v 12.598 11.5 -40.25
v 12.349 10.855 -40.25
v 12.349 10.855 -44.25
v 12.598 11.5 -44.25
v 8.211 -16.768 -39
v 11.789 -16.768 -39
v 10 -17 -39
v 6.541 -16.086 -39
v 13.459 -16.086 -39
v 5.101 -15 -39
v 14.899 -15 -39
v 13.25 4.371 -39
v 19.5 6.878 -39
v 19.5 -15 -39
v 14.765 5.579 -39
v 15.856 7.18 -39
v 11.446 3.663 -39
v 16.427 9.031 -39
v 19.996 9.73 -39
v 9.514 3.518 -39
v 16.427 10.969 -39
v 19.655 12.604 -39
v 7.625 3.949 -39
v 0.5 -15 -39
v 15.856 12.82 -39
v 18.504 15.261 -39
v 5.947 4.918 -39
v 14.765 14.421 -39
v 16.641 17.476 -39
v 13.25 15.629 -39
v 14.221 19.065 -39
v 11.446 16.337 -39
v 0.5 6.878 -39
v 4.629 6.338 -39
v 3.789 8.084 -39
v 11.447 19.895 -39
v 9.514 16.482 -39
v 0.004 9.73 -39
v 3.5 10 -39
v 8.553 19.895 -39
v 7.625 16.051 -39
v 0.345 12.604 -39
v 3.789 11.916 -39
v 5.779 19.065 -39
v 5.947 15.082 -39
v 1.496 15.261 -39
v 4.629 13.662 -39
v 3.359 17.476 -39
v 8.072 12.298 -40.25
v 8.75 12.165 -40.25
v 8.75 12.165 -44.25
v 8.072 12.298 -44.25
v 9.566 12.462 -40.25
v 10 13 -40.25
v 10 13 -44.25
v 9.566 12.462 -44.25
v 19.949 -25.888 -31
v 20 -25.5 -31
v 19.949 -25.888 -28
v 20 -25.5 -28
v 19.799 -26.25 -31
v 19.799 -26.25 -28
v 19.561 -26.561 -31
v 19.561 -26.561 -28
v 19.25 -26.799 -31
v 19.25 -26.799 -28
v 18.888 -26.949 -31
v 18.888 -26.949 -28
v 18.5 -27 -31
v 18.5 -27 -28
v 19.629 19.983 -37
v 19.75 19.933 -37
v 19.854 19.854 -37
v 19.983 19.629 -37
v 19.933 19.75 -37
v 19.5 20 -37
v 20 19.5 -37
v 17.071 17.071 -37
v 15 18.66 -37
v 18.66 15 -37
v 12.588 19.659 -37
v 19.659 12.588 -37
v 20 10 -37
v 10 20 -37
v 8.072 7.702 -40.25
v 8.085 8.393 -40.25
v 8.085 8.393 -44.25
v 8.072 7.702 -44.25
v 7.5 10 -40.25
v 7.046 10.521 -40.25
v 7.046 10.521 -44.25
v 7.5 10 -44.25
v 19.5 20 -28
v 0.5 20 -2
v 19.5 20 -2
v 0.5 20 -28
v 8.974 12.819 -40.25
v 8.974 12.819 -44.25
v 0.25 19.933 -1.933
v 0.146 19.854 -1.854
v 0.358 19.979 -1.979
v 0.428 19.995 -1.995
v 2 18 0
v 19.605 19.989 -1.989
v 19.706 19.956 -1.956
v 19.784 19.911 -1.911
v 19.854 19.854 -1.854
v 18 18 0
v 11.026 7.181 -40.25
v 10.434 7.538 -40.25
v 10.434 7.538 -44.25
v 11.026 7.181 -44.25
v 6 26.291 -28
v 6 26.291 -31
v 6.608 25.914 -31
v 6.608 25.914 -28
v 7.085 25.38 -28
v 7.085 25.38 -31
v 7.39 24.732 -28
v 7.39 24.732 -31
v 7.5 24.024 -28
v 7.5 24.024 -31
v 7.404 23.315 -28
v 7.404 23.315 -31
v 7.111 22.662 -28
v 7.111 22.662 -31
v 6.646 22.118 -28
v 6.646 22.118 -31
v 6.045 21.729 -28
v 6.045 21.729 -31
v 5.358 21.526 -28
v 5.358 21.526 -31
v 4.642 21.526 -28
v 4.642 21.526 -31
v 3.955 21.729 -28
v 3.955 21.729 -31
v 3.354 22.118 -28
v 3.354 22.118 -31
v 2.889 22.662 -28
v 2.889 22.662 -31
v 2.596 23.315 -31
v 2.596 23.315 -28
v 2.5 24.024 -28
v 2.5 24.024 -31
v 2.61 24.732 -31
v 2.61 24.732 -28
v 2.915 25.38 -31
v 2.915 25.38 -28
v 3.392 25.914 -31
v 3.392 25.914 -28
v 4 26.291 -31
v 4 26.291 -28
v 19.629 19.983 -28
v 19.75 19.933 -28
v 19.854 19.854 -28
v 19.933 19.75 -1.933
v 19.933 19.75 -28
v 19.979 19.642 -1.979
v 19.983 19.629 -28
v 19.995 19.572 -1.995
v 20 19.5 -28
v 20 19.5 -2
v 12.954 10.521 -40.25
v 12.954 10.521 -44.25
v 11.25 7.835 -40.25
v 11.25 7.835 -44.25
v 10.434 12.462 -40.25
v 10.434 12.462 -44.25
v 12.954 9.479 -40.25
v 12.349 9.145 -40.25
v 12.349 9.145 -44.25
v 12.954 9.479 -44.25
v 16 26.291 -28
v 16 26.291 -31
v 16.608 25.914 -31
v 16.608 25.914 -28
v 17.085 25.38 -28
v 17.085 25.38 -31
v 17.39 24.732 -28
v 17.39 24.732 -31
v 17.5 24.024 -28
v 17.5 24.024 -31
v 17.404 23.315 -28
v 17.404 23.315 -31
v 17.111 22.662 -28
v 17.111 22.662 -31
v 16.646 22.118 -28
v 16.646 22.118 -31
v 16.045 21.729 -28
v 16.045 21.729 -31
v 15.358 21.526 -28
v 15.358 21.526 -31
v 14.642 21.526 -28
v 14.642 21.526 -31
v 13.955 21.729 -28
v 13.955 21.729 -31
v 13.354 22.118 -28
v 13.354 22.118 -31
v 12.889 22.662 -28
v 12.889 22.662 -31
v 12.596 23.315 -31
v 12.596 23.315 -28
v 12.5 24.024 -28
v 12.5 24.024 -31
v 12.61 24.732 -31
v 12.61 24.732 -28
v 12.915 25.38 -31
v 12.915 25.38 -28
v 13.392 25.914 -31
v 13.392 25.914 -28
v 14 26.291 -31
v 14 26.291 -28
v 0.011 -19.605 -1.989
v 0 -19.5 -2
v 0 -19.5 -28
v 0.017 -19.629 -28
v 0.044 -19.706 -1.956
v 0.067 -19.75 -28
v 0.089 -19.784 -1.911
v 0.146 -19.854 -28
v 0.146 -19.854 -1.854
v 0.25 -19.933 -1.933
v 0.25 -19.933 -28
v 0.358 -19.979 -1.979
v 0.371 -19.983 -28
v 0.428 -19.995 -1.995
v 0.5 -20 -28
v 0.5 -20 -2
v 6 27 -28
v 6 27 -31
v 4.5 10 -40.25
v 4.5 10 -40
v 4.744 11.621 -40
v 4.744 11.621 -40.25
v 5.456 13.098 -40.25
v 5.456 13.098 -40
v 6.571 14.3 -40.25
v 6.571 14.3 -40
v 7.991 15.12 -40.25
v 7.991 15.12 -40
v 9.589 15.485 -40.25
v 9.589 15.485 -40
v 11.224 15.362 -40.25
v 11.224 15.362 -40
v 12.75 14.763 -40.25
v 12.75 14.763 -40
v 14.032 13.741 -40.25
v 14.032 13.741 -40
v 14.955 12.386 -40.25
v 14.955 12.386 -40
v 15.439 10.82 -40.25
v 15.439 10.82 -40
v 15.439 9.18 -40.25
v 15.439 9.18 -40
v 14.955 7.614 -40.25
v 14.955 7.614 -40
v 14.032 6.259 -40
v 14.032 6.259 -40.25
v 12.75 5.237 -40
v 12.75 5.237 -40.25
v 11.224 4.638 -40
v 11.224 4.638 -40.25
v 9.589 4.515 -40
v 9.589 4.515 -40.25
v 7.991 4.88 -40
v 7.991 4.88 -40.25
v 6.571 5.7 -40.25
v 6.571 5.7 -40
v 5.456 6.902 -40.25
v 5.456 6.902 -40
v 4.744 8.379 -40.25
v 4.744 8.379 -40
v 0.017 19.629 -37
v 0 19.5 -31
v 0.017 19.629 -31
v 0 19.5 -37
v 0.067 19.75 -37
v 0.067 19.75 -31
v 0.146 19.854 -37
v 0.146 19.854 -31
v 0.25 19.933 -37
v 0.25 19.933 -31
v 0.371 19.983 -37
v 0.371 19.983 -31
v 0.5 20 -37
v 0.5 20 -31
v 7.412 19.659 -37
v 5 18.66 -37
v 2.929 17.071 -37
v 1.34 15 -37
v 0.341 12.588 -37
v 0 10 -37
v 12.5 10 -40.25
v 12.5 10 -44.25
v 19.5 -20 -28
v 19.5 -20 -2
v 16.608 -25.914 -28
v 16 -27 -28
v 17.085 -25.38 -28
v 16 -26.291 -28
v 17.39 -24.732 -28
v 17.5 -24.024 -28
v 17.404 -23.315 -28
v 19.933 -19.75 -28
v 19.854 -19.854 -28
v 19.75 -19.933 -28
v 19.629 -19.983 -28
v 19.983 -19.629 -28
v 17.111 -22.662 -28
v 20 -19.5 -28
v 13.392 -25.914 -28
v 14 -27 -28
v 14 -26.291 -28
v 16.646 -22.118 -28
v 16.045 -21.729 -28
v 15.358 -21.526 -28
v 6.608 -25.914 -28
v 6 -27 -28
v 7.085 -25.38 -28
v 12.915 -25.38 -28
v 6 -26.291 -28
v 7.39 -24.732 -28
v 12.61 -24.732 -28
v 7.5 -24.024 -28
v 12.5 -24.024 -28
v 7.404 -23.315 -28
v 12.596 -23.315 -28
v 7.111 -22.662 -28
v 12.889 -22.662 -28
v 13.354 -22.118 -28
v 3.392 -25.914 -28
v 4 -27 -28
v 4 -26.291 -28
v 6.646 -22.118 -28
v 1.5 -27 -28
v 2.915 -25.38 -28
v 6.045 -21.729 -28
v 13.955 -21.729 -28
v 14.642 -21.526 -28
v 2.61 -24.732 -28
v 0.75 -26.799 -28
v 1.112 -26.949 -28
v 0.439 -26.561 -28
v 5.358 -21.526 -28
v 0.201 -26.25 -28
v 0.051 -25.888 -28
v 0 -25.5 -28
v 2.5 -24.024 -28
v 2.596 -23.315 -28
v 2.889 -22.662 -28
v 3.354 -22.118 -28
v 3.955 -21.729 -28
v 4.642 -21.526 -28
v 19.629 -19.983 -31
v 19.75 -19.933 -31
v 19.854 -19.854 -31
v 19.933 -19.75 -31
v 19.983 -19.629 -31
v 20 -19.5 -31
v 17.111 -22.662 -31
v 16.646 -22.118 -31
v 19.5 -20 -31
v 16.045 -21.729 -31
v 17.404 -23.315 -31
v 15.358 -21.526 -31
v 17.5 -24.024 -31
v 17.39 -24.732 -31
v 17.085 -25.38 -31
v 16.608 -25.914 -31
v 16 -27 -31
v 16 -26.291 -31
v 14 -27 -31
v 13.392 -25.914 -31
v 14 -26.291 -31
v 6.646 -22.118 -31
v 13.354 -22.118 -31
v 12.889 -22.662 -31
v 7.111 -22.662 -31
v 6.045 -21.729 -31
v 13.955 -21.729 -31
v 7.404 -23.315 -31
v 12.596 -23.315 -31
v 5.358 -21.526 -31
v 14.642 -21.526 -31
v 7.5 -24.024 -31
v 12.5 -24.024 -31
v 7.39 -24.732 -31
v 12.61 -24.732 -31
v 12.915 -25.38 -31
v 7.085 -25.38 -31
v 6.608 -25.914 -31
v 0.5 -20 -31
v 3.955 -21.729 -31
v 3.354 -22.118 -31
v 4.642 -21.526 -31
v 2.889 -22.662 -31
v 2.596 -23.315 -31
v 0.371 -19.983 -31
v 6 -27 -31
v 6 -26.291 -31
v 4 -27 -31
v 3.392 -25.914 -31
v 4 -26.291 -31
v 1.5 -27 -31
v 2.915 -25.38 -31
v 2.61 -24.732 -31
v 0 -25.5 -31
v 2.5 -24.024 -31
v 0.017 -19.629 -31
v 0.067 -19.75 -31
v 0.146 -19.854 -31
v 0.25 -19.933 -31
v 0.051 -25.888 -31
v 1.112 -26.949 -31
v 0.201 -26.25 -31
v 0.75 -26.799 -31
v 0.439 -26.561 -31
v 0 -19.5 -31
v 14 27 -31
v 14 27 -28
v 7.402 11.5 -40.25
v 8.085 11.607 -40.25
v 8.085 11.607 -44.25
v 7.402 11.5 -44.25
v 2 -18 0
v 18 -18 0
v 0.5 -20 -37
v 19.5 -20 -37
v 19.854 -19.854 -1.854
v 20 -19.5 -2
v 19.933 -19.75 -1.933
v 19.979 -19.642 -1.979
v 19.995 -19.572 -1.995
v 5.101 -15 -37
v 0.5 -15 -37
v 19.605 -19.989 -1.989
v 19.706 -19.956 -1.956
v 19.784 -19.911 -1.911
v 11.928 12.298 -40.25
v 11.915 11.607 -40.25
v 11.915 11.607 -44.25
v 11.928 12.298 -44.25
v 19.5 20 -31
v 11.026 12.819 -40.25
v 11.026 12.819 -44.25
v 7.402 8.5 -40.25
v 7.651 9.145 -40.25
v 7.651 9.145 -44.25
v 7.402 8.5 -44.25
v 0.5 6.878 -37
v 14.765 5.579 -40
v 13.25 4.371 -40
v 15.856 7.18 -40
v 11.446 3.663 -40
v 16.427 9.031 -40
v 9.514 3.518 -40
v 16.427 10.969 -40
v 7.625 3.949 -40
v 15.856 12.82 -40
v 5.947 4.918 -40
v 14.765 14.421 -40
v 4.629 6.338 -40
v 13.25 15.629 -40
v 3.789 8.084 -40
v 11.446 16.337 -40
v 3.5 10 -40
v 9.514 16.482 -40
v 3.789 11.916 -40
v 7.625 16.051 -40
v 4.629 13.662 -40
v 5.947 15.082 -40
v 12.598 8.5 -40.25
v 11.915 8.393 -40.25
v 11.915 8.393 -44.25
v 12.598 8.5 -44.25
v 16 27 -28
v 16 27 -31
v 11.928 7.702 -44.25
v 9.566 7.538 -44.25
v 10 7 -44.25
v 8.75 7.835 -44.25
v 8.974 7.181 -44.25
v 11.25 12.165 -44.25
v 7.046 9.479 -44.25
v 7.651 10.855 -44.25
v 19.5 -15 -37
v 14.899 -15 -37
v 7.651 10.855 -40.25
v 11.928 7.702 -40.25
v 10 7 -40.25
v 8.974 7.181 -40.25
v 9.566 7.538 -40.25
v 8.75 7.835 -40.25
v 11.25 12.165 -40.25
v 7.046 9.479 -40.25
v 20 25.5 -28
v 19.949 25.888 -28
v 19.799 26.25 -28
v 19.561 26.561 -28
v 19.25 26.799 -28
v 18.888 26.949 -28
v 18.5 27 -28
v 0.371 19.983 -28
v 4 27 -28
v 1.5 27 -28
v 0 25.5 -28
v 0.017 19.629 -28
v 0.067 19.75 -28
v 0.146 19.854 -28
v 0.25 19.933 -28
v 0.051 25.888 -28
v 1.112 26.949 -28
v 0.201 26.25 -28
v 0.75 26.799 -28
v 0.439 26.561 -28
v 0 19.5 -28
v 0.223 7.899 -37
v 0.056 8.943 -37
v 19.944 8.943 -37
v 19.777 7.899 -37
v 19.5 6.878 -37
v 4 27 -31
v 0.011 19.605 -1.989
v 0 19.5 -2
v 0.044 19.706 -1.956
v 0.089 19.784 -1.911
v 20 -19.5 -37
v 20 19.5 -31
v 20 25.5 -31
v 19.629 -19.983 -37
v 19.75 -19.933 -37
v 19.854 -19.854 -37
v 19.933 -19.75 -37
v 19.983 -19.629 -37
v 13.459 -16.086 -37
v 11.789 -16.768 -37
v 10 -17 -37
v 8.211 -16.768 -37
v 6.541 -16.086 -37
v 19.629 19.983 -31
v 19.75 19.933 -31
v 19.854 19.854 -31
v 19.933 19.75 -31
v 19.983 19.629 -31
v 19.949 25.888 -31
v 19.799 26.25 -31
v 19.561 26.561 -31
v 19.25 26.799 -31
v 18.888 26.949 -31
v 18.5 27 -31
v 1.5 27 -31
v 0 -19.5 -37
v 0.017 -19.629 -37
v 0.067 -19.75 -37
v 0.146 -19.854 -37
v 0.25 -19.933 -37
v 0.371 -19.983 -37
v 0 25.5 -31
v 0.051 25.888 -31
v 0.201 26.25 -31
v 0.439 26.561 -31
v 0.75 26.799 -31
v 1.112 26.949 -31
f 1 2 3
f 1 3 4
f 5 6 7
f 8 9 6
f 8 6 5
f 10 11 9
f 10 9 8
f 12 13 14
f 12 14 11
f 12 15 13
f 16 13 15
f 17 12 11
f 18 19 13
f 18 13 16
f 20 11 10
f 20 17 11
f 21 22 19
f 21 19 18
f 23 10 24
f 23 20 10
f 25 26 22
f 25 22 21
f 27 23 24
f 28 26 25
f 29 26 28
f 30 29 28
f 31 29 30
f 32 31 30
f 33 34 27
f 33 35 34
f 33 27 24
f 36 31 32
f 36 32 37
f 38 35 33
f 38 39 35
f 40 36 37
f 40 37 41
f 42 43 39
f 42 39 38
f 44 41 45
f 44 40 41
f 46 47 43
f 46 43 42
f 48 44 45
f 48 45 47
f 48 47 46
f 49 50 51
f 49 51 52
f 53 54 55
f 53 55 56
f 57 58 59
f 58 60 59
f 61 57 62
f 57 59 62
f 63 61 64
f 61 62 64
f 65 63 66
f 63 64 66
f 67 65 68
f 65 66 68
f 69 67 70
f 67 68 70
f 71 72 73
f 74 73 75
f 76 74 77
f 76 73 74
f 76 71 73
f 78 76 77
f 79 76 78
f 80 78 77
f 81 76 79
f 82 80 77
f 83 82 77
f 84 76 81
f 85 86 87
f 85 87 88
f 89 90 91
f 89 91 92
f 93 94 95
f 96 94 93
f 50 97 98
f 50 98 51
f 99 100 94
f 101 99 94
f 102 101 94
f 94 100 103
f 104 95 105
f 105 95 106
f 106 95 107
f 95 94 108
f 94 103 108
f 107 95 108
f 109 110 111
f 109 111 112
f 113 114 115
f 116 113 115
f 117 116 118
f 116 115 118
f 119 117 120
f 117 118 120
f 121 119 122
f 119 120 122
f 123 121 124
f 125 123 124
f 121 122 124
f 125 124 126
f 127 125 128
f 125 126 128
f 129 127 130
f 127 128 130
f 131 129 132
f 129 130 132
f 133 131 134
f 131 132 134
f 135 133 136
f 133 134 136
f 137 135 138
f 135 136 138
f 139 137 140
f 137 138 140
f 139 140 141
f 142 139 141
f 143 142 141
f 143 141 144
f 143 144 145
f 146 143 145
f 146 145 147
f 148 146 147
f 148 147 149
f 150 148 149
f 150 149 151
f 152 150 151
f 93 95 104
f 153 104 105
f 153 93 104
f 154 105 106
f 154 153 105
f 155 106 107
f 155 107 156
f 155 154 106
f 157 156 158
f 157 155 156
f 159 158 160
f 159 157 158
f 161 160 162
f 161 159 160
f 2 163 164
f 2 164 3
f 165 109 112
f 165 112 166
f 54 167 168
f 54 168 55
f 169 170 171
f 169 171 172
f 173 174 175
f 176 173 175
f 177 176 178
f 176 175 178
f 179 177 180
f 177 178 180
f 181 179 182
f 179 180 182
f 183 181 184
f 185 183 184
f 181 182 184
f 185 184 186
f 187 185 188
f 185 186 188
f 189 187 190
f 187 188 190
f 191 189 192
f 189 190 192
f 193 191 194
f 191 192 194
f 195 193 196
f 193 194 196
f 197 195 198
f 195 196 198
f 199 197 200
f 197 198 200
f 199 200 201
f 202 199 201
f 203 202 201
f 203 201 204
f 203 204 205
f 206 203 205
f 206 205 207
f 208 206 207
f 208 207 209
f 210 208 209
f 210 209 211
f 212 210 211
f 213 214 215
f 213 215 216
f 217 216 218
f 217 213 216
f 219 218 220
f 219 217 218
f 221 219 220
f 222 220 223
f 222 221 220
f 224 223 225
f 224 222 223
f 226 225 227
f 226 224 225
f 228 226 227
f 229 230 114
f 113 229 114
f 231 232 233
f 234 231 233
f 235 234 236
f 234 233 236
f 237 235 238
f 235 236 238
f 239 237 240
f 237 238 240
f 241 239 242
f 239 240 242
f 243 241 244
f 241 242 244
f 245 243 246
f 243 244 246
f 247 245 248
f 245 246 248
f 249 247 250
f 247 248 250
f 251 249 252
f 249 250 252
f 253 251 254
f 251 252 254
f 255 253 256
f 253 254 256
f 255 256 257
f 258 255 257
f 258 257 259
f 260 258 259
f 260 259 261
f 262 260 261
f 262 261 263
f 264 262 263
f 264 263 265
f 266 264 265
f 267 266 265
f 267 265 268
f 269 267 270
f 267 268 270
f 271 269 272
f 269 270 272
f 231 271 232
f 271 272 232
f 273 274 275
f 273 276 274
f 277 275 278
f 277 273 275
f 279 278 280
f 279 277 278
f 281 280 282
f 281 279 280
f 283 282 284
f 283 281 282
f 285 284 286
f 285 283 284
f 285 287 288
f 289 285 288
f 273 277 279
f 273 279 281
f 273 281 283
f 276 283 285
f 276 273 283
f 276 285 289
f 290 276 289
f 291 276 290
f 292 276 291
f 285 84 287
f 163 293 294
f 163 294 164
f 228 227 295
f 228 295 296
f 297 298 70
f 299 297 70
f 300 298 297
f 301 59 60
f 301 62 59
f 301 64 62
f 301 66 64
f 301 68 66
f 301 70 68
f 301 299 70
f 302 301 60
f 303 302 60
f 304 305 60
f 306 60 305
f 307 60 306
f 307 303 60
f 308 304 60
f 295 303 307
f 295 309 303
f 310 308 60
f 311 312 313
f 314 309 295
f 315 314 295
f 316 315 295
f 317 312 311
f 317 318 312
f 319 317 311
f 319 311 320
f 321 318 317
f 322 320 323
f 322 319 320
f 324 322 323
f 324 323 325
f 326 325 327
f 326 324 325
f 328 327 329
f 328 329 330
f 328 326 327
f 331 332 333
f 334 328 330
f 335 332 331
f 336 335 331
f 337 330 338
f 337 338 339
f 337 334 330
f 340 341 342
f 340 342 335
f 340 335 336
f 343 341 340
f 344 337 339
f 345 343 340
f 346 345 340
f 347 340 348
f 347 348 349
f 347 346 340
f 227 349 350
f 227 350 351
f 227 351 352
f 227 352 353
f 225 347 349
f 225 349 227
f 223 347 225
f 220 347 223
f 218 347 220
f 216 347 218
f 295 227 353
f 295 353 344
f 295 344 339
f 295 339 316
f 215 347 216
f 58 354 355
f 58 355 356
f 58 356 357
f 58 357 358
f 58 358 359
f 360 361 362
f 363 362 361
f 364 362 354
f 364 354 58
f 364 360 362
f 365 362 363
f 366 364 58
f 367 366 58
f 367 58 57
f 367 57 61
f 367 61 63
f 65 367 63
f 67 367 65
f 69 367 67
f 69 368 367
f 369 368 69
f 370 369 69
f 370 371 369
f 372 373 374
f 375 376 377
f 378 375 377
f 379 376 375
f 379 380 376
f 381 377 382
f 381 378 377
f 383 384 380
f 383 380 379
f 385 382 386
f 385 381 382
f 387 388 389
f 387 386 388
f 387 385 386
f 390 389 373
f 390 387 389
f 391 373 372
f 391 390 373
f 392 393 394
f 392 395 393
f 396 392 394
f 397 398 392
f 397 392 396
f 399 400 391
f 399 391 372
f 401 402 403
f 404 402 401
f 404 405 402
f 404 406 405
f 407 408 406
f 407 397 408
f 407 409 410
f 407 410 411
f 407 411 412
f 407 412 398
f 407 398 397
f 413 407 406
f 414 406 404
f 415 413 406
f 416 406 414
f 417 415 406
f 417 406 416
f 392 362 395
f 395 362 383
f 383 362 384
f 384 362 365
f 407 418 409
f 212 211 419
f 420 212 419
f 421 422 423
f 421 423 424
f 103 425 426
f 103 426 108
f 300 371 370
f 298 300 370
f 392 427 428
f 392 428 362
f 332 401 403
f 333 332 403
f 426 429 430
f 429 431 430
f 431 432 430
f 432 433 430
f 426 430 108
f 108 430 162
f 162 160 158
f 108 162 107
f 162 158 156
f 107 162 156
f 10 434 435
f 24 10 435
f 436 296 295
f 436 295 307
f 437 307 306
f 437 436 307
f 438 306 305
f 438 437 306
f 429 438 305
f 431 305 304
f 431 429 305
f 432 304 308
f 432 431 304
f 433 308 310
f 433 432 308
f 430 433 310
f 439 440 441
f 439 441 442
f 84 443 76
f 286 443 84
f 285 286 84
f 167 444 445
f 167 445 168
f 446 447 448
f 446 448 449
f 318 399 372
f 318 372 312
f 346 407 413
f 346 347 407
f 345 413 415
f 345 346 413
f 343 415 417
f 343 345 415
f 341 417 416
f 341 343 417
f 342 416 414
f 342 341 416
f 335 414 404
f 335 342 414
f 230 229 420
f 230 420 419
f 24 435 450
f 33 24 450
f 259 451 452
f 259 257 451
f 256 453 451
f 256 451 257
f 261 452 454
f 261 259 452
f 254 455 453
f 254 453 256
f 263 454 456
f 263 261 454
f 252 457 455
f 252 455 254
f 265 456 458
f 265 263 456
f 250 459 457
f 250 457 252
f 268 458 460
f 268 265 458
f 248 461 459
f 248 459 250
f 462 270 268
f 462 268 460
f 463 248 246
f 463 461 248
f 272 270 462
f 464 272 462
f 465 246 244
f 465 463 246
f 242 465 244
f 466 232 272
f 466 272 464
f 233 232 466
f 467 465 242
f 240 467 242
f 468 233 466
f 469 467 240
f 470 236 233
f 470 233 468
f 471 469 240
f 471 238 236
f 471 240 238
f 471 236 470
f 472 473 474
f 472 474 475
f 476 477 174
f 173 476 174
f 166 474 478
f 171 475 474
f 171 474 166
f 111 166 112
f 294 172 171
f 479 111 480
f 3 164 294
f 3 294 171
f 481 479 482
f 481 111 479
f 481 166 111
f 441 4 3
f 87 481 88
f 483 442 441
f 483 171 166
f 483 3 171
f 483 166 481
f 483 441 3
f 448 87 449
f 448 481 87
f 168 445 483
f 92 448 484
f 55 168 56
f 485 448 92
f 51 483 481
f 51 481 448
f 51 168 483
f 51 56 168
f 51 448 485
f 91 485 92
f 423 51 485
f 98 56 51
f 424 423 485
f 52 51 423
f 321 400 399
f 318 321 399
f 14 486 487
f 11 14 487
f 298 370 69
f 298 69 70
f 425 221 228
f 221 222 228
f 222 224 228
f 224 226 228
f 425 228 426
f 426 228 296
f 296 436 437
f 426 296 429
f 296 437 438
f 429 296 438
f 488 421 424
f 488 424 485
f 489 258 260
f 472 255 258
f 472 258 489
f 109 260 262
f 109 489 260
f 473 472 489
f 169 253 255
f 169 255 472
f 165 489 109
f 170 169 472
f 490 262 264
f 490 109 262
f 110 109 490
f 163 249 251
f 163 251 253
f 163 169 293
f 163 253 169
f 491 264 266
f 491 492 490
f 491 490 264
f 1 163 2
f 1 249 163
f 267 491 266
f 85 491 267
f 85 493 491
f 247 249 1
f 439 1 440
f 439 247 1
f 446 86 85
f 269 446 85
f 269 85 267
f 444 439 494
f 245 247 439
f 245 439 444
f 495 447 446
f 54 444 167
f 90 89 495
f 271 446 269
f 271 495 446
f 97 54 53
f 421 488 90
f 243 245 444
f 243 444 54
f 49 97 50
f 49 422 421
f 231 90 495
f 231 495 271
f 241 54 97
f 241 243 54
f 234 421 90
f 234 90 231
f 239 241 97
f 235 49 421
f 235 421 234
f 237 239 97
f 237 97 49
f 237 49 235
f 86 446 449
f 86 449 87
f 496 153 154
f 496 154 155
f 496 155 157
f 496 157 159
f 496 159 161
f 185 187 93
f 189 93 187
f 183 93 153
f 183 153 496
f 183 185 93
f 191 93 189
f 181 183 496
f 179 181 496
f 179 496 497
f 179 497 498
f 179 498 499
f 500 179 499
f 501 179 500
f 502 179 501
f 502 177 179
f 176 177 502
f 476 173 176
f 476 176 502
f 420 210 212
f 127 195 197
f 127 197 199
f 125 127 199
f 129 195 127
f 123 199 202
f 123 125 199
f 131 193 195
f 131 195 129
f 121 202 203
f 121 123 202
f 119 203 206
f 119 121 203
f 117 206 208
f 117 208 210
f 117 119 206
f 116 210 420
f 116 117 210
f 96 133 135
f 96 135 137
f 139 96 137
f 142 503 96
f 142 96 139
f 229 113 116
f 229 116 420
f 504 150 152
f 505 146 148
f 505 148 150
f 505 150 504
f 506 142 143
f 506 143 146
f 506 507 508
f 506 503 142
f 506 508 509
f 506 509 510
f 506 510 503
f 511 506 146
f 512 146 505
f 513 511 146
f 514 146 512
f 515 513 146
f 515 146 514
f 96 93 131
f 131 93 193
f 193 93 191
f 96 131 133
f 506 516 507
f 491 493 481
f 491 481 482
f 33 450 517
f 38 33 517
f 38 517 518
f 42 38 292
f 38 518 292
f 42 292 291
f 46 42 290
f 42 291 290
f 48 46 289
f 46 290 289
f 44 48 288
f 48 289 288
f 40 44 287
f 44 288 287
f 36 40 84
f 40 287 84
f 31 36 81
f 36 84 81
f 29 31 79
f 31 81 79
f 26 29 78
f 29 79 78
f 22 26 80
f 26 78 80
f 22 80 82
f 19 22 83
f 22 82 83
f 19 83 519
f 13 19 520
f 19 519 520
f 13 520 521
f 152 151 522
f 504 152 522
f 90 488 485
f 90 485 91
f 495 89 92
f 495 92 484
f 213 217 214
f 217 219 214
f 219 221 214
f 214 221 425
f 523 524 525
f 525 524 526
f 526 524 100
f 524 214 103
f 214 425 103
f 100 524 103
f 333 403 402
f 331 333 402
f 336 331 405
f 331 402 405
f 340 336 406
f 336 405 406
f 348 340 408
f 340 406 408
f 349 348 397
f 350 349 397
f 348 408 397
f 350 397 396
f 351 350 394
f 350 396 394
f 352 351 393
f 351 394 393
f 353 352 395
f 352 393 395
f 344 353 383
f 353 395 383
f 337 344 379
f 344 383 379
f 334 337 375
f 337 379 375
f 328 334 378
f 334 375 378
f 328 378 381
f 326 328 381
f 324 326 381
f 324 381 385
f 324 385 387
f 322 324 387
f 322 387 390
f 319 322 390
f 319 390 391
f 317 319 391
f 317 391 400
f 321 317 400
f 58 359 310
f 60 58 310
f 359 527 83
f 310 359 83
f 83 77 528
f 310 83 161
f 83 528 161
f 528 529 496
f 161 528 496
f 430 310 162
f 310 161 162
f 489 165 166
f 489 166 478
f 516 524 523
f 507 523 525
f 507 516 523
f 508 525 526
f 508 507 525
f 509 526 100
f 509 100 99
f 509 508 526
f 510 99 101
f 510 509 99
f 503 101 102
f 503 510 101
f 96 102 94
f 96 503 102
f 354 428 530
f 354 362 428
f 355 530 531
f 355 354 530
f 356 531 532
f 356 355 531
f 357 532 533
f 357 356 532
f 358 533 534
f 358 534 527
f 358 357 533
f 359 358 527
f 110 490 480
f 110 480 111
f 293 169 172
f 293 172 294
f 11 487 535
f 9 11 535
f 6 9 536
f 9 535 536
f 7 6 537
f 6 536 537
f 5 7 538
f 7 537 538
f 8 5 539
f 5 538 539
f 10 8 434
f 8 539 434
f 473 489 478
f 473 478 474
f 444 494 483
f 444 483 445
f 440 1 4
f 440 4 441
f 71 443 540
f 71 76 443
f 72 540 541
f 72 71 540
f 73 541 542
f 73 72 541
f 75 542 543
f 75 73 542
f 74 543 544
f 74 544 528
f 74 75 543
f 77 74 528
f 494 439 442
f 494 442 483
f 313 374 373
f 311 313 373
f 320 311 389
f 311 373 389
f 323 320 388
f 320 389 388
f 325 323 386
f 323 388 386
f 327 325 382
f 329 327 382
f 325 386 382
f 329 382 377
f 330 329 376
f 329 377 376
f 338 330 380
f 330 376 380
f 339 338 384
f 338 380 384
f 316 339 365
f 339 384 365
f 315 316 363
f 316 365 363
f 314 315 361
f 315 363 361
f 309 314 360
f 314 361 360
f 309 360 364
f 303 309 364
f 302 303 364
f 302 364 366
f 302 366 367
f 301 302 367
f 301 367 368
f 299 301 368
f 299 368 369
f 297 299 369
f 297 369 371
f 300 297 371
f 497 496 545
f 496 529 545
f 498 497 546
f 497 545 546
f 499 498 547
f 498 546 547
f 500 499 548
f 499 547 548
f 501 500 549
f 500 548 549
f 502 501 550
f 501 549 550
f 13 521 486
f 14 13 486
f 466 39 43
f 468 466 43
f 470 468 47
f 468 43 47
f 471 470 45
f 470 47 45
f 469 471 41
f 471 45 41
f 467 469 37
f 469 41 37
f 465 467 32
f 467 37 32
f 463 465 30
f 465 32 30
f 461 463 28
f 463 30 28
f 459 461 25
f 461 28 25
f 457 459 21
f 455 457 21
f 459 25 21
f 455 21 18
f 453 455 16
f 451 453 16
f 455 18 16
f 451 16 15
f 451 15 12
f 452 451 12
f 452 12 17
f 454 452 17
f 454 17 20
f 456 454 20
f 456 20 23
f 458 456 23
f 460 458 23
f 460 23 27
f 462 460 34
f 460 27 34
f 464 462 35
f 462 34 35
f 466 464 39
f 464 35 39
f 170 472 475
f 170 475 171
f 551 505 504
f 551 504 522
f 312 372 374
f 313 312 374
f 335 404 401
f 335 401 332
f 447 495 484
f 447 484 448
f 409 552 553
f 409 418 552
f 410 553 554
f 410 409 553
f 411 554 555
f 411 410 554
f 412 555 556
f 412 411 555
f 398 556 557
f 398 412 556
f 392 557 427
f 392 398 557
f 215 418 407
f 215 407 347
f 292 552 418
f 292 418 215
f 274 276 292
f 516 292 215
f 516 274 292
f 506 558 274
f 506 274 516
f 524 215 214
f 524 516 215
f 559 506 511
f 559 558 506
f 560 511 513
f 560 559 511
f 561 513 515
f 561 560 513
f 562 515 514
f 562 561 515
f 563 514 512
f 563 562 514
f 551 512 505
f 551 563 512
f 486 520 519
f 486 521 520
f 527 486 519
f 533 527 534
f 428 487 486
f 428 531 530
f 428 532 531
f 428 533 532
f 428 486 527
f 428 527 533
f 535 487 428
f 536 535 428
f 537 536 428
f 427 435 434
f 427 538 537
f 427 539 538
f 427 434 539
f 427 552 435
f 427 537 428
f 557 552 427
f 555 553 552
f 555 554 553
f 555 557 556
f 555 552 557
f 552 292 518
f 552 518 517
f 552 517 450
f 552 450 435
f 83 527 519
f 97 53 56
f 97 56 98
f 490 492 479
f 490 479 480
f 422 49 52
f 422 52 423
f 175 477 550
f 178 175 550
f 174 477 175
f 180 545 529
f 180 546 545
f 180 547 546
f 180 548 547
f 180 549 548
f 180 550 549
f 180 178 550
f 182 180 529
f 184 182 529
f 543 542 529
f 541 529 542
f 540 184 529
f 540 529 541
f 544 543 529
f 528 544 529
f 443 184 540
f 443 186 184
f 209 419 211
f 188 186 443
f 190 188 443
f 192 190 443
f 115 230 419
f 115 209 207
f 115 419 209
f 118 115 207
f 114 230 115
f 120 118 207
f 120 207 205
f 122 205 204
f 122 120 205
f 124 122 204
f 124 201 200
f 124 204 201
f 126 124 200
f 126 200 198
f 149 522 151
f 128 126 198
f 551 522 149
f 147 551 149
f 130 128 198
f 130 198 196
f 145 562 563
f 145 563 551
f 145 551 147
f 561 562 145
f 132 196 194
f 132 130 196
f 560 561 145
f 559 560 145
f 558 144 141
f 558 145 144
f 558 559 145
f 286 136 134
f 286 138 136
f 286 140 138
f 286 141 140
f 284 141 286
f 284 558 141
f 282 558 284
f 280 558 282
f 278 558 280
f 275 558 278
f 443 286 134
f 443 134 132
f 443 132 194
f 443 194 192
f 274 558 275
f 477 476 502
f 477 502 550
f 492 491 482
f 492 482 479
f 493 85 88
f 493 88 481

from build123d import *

# Parameters (mm, degrees)
BOSS_EXTRU_1_DEPTH      = 20
BOSS_EXTRU_2_DEPTH      = 2
ESQUISSE3_R             = 6.5
BOSS_EXTRU_3_DEPTH      = 1
ESQUISSE4_R             = 5.5
BOSS_EXTRU_4_DEPTH      = 0.25
ESQUISSE5_R             = 3
BOSS_EXTRU_5_DEPTH      = 4
ENL_V_START             = -4
ENL_V_MAT_EXTRU_1_DEPTH = 4
ENL_V_MAT_EXTRU_2_DEPTH = 46.716517803
CONG_1_R                = 1.5
CHANFREIN1_SIZE         = 2
CONG_2_R                = 0.5


with BuildPart() as part:
    # Esquisse1 → Boss.-Extru.1 (new body)
    with BuildSketch(Plane(origin=(0, 0, 0), x_dir=(0, 0, -1), z_dir=(1, 0, 0))):
        Polygon((0, -20), (0, 20), (28, 20), (28, 27), (31, 27), (31, 20), (37, 20), (37, -20), (31, -20), (31, -27), (28, -27), (28, -20), align=None)
    extrude(amount=BOSS_EXTRU_1_DEPTH)

    # Esquisse2 → Boss.-Extru.2 (add)
    with BuildSketch(Plane(origin=(0, 0, -37), x_dir=(-1, 0, 0), z_dir=(0, 0, -1))):
        with BuildLine():
            ThreePointArc((-0.5, 6.877501001), (-10, 20), (-19.5, 6.877501001))
            Line((-19.5, 6.877501001), (-19.5, -15))
            Line((-19.5, -15), (-14.898979486, -15))
            ThreePointArc((-14.898979486, -15), (-10, -17), (-5.101020514, -15))
            Line((-5.101020514, -15), (-0.5, -15))
            Line((-0.5, -15), (-0.5, 6.877501001))
        make_face()
    extrude(amount=BOSS_EXTRU_2_DEPTH)

    # Esquisse3 → Boss.-Extru.3 (add)
    with BuildSketch(Plane(origin=(0, 0, -39), x_dir=(-1, 0, 0), z_dir=(0, 0, -1))):
        with Locations((-10, 10)):
            Circle(ESQUISSE3_R)
    extrude(amount=BOSS_EXTRU_3_DEPTH)

    # Esquisse4 → Boss.-Extru.4 (add)
    with BuildSketch(Plane(origin=(0, 0, -40), x_dir=(-1, 0, 0), z_dir=(0, 0, -1))):
        with Locations((-10, 10)):
            Circle(ESQUISSE4_R)
    extrude(amount=BOSS_EXTRU_4_DEPTH)

    # Esquisse5 → Boss.-Extru.5 (add)
    with BuildSketch(Plane(origin=(0, 0, -40.25), x_dir=(-1, 0, 0), z_dir=(0, 0, -1))):
        with Locations((-10, 10)):
            Circle(ESQUISSE5_R)
    extrude(amount=BOSS_EXTRU_5_DEPTH)

    # Esquisse6 → Enlèv. mat.-Extru.1 (cut)
    with BuildSketch(Plane(origin=(0, 0, -44.25), x_dir=(-1, 0, 0), z_dir=(0, 0, -1)).offset(ENL_V_START)):
        with BuildLine():
            ThreePointArc((-8.97393957, 12.819077862), (-9.479055467, 12.954423259), (-10, 13))
            Line((-10, 13), (-9.565879556, 12.462019383))
            Line((-9.565879556, 12.462019383), (-8.97393957, 12.819077862))
        make_face()
        with BuildLine():
            Line((-10.434120444, 12.462019383), (-10, 13))
            ThreePointArc((-10, 13), (-10.520944533, 12.954423259), (-11.02606043, 12.819077862))
            Line((-11.02606043, 12.819077862), (-10.434120444, 12.462019383))
        make_face()
        with BuildLine():
            ThreePointArc((-8.071637171, 12.298133329), (-8.5, 12.598076211), (-8.97393957, 12.819077862))
            Line((-8.97393957, 12.819077862), (-8.75, 12.165063509))
            Line((-8.75, 12.165063509), (-8.071637171, 12.298133329))
        make_face()
        with BuildLine():
            Line((-11.25, 12.165063509), (-11.02606043, 12.819077862))
            ThreePointArc((-11.02606043, 12.819077862), (-11.5, 12.598076211), (-11.928362829, 12.298133329))
            Line((-11.928362829, 12.298133329), (-11.25, 12.165063509))
        make_face()
        with BuildLine():
            ThreePointArc((-7.401923789, 11.5), (-7.701866671, 11.928362829), (-8.071637171, 12.298133329))
            Line((-8.071637171, 12.298133329), (-8.084888892, 11.606969024))
            Line((-8.084888892, 11.606969024), (-7.401923789, 11.5))
        make_face()
        with BuildLine():
            Line((-11.915111108, 11.606969024), (-11.928362829, 12.298133329))
            ThreePointArc((-11.928362829, 12.298133329), (-12.298133329, 11.928362829), (-12.598076211, 11.5))
            Line((-12.598076211, 11.5), (-11.915111108, 11.606969024))
        make_face()
        with BuildLine():
            ThreePointArc((-7.045576741, 10.520944533), (-7.180922138, 11.02606043), (-7.401923789, 11.5))
            Line((-7.401923789, 11.5), (-7.650768448, 10.855050358))
            Line((-7.650768448, 10.855050358), (-7.045576741, 10.520944533))
        make_face()
        with BuildLine():
            Line((-12.349231552, 10.855050358), (-12.598076211, 11.5))
            ThreePointArc((-12.598076211, 11.5), (-12.819077862, 11.02606043), (-12.954423259, 10.520944533))
            Line((-12.954423259, 10.520944533), (-12.349231552, 10.855050358))
        make_face()
        with BuildLine():
            ThreePointArc((-7.045576741, 9.479055467), (-7, 10), (-7.045576741, 10.520944533))
            Line((-7.045576741, 10.520944533), (-7.5, 10))
            Line((-7.5, 10), (-7.045576741, 9.479055467))
        make_face()
        with BuildLine():
            Line((-12.5, 10), (-12.954423259, 10.520944533))
            ThreePointArc((-12.954423259, 10.520944533), (-13, 10), (-12.954423259, 9.479055467))
            Line((-12.954423259, 9.479055467), (-12.5, 10))
        make_face()
        with BuildLine():
            Line((-12.349231552, 9.144949642), (-12.954423259, 9.479055467))
            ThreePointArc((-12.954423259, 9.479055467), (-12.819077862, 8.97393957), (-12.598076211, 8.5))
            Line((-12.598076211, 8.5), (-12.349231552, 9.144949642))
        make_face()
        with BuildLine():
            ThreePointArc((-7.401923789, 8.5), (-7.180922138, 8.97393957), (-7.045576741, 9.479055467))
            Line((-7.045576741, 9.479055467), (-7.650768448, 9.144949642))
            Line((-7.650768448, 9.144949642), (-7.401923789, 8.5))
        make_face()
        with BuildLine():
            Line((-11.915111108, 8.393030976), (-12.598076211, 8.5))
            ThreePointArc((-12.598076211, 8.5), (-12.298133329, 8.071637171), (-11.928362829, 7.701866671))
            Line((-11.928362829, 7.701866671), (-11.915111108, 8.393030976))
        make_face()
        with BuildLine():
            ThreePointArc((-8.071637171, 7.701866671), (-7.701866671, 8.071637171), (-7.401923789, 8.5))
            Line((-7.401923789, 8.5), (-8.084888892, 8.393030976))
            Line((-8.084888892, 8.393030976), (-8.071637171, 7.701866671))
        make_face()
        with BuildLine():
            Line((-11.25, 7.834936491), (-11.928362829, 7.701866671))
            ThreePointArc((-11.928362829, 7.701866671), (-11.5, 7.401923789), (-11.02606043, 7.180922138))
            Line((-11.02606043, 7.180922138), (-11.25, 7.834936491))
        make_face()
        with BuildLine():
            ThreePointArc((-8.97393957, 7.180922138), (-8.5, 7.401923789), (-8.071637171, 7.701866671))
            Line((-8.071637171, 7.701866671), (-8.75, 7.834936491))
            Line((-8.75, 7.834936491), (-8.97393957, 7.180922138))
        make_face()
        with BuildLine():
            Line((-10.434120444, 7.537980617), (-11.02606043, 7.180922138))
            ThreePointArc((-11.02606043, 7.180922138), (-10.520944533, 7.045576741), (-10, 7))
            Line((-10, 7), (-10.434120444, 7.537980617))
        make_face()
        with BuildLine():
            ThreePointArc((-10, 7), (-9.479055467, 7.045576741), (-8.97393957, 7.180922138))
            Line((-8.97393957, 7.180922138), (-9.565879556, 7.537980617))
            Line((-9.565879556, 7.537980617), (-10, 7))
        make_face()
    extrude(amount=ENL_V_MAT_EXTRU_1_DEPTH, mode=Mode.SUBTRACT)

    # Esquisse7 → Enlèv. mat.-Extru.2 (cut, through all)
    with BuildSketch(Plane(origin=(0, 0, -31), x_dir=(-1, 0, 0), z_dir=(0, 0, -1))):
        with BuildLine():
            Line((-4, 27), (-6, 27))
            Line((-6, 27), (-6, 26.291287847))
            ThreePointArc((-6, 26.291287847), (-5, 21.5), (-4, 26.291287847))
            Line((-4, 26.291287847), (-4, 27))
        make_face()
        with BuildLine():
            Line((-14, 26.291287847), (-14, 27))
            Line((-14, 27), (-16, 27))
            Line((-16, 27), (-16, 26.291287847))
            ThreePointArc((-16, 26.291287847), (-15, 21.5), (-14, 26.291287847))
        make_face()
        with BuildLine():
            Line((-6, -27), (-4, -27))
            Line((-4, -27), (-4, -26.291287847))
            ThreePointArc((-4, -26.291287847), (-5, -21.5), (-6, -26.291287847))
            Line((-6, -26.291287847), (-6, -27))
        make_face()
        with BuildLine():
            Line((-16, -27), (-14, -27))
            Line((-14, -27), (-14, -26.291287847))
            ThreePointArc((-14, -26.291287847), (-15, -21.5), (-16, -26.291287847))
            Line((-16, -26.291287847), (-16, -27))
        make_face()
    extrude(amount=-ENL_V_MAT_EXTRU_2_DEPTH, mode=Mode.SUBTRACT)

    # Congé1
    cong_1_edges = [part.edges().sort_by_distance(p)[0] for p in [
        (0, -27, -29.5),
        (0, 27, -29.5),
        (20, 27, -29.5),
        (20, -27, -29.5),
    ]]
    fillet(cong_1_edges, radius=CONG_1_R)

    # Chanfrein1
    chanfrein1_edges = [part.edges().sort_by_distance(p)[0] for p in [
        (0, 0, 0),
        (10, -20, 0),
        (10, 20, 0),
        (20, 0, 0),
    ]]
    chamfer(chanfrein1_edges, length=CHANFREIN1_SIZE)

    # Congé2
    cong_2_edges = [part.edges().sort_by_distance(p)[0] for p in [
        (20, 20, -34),
        (0, 20, -15),
        (0, 20, -34),
        (0, -20, -34),
        (20, 20, -15),
        (20, -20, -15),
        (0, -20, -15),
        (20, -20, -34),
    ]]
    fillet(cong_2_edges, radius=CONG_2_R)


solid = part.part
